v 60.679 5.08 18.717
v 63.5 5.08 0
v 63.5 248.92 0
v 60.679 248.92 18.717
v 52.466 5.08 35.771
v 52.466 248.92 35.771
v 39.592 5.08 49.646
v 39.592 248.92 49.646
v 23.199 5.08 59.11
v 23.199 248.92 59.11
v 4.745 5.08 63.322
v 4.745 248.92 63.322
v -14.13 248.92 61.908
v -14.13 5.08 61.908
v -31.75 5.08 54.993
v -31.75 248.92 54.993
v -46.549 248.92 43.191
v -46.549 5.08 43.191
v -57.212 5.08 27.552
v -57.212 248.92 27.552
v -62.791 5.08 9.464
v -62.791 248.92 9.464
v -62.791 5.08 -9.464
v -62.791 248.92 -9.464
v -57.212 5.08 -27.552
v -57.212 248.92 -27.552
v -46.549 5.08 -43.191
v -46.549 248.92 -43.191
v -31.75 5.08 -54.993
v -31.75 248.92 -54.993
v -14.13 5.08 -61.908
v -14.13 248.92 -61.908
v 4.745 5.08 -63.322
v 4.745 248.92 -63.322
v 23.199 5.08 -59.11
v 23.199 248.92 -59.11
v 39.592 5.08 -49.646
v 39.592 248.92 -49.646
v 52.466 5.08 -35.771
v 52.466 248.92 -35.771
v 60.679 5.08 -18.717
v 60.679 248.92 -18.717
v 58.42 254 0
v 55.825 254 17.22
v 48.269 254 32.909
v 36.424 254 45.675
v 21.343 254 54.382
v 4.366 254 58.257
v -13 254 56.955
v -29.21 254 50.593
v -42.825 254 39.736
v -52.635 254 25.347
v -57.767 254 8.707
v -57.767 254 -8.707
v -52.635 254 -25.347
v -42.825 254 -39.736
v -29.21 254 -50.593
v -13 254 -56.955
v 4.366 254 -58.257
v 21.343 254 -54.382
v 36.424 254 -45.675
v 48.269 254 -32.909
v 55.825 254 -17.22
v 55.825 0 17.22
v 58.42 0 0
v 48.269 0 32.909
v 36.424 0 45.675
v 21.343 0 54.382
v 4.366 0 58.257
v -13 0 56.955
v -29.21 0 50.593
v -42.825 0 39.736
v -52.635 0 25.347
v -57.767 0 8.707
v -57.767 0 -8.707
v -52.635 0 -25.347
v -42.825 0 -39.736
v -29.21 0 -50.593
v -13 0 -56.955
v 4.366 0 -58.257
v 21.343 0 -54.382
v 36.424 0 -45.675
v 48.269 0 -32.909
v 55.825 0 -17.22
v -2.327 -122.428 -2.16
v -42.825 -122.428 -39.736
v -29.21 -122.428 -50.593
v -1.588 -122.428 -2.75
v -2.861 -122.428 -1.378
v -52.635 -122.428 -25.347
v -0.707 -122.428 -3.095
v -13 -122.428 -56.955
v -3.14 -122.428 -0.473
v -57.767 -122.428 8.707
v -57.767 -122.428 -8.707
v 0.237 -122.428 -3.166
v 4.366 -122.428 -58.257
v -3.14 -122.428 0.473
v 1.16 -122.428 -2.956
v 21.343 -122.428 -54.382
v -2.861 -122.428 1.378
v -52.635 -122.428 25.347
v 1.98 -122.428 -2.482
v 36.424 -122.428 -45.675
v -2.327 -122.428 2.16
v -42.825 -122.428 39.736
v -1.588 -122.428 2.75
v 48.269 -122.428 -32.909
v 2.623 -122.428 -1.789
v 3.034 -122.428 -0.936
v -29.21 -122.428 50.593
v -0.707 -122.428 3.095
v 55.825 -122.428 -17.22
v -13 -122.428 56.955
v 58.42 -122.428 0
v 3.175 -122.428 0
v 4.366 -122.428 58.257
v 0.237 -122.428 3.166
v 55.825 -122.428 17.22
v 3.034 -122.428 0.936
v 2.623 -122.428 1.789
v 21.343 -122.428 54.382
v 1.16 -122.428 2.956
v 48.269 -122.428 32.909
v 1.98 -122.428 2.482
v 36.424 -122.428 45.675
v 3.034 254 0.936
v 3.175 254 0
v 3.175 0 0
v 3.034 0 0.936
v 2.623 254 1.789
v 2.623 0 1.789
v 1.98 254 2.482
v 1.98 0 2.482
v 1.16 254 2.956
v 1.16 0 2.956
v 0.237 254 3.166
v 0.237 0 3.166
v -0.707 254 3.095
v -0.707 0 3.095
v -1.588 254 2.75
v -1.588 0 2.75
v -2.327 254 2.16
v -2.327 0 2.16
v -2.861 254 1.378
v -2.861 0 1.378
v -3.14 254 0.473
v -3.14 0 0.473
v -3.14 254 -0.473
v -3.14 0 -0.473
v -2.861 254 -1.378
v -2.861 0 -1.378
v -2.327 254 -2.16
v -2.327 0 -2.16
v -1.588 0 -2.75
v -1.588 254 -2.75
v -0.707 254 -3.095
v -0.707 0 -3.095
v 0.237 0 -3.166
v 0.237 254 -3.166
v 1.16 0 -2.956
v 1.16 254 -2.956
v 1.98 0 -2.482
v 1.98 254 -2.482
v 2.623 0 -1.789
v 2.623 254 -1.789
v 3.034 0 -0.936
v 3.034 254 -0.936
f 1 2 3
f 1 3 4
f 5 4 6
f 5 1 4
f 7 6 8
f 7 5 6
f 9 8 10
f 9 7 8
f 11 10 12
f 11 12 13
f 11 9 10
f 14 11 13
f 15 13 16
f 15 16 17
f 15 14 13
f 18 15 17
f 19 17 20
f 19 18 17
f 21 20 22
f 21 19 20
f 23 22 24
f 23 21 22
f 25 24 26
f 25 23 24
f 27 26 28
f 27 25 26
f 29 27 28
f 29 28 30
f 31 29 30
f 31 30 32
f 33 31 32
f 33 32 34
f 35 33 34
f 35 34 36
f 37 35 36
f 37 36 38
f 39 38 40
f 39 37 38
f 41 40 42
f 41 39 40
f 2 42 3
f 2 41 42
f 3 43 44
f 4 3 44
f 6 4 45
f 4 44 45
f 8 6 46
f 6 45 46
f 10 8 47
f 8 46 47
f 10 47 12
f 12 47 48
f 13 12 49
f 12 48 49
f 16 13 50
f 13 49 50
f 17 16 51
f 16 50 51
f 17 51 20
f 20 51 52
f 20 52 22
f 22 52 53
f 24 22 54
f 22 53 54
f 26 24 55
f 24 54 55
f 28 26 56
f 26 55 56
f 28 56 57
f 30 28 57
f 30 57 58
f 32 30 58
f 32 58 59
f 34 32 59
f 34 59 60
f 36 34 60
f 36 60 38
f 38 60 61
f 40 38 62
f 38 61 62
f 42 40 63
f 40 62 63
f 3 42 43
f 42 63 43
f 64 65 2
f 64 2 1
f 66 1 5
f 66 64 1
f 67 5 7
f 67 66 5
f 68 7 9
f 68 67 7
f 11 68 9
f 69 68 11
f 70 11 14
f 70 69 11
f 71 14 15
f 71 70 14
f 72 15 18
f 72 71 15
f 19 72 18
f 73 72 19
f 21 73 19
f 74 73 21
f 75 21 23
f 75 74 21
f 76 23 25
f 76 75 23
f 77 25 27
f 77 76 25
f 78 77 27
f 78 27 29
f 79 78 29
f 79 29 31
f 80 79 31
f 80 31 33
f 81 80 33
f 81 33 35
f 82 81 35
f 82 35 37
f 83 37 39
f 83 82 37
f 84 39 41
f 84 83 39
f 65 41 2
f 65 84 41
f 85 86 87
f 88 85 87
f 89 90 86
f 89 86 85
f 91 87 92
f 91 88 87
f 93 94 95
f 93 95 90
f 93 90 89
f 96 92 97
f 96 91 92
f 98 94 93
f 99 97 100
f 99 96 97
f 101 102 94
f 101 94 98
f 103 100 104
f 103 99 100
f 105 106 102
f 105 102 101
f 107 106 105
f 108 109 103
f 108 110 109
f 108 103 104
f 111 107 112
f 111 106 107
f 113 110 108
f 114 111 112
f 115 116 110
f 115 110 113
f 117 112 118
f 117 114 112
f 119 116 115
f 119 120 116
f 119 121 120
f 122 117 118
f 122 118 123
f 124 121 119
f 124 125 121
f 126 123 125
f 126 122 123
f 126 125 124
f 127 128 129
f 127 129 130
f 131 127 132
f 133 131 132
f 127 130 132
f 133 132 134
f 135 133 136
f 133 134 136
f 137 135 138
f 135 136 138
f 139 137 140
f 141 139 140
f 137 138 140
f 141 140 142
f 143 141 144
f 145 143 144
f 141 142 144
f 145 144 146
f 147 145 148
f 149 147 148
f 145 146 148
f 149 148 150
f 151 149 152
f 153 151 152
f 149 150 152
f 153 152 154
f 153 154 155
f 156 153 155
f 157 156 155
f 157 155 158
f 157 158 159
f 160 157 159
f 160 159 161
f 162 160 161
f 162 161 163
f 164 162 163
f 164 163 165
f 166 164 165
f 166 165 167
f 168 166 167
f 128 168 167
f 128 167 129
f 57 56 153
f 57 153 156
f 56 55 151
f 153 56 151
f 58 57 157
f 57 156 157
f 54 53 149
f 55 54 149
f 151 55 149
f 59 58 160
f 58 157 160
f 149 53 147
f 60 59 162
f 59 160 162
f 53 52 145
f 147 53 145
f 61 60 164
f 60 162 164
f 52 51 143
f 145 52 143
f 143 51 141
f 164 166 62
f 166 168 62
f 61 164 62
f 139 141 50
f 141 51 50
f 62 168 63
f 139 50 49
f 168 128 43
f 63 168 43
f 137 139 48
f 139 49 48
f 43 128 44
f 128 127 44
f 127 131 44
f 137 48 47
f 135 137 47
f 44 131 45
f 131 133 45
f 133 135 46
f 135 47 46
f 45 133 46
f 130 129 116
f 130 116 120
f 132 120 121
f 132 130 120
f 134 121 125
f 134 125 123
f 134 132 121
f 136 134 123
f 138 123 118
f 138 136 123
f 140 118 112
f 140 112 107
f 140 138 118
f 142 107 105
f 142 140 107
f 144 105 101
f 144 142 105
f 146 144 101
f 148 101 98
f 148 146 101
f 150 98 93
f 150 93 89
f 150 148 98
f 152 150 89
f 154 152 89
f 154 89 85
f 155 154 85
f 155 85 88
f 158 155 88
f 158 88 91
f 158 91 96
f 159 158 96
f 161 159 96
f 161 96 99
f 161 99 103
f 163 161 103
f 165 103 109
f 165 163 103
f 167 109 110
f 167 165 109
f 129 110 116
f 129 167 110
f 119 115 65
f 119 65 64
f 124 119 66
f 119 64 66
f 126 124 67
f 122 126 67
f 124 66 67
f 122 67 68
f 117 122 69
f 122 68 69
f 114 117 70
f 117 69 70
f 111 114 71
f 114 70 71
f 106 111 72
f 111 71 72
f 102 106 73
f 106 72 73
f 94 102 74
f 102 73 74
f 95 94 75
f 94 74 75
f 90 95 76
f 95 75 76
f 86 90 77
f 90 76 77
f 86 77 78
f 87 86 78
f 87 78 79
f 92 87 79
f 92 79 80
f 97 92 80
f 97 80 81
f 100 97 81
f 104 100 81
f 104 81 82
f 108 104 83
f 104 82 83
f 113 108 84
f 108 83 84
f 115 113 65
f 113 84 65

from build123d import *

# Parameters (mm, degrees)
F0_R     = 63.5
F1_DEPTH = 254
F2_SIZE2 = 5.08
F2_SIZE  = 5.08
F4_D     = 6.35
F5_DEPTH = 122.428


with BuildPart() as f1:
    # F0 (on Front) → F1 (new body)
    with BuildSketch(Plane.XZ):
        Circle(F0_R)
    extrude(amount=-F1_DEPTH)

    # F2
    f2_edges = [f1.edges().sort_by_distance(p)[0] for p in [
        (63.5, 127, 0),
        (-63.5, 0, 0),
        (-63.5, 254, 0),
    ]]
    chamfer(f2_edges, length=F2_SIZE, length2=F2_SIZE2)

    # F4 (through all)
    with Locations(Plane(origin=(0, 254, 0), x_dir=(-1, 0, 0), z_dir=(0, 1, 0))):
        with Locations((0, 0)):
            Hole(F4_D / 2)

    # F5 (add): a face of the model
    f5_faces = [f1.faces().sort_by_distance(p)[0] for p in [
        (-56.7676328737, 0, 0),
    ]]
    extrude(f5_faces, amount=F5_DEPTH)


solid = f1.part
